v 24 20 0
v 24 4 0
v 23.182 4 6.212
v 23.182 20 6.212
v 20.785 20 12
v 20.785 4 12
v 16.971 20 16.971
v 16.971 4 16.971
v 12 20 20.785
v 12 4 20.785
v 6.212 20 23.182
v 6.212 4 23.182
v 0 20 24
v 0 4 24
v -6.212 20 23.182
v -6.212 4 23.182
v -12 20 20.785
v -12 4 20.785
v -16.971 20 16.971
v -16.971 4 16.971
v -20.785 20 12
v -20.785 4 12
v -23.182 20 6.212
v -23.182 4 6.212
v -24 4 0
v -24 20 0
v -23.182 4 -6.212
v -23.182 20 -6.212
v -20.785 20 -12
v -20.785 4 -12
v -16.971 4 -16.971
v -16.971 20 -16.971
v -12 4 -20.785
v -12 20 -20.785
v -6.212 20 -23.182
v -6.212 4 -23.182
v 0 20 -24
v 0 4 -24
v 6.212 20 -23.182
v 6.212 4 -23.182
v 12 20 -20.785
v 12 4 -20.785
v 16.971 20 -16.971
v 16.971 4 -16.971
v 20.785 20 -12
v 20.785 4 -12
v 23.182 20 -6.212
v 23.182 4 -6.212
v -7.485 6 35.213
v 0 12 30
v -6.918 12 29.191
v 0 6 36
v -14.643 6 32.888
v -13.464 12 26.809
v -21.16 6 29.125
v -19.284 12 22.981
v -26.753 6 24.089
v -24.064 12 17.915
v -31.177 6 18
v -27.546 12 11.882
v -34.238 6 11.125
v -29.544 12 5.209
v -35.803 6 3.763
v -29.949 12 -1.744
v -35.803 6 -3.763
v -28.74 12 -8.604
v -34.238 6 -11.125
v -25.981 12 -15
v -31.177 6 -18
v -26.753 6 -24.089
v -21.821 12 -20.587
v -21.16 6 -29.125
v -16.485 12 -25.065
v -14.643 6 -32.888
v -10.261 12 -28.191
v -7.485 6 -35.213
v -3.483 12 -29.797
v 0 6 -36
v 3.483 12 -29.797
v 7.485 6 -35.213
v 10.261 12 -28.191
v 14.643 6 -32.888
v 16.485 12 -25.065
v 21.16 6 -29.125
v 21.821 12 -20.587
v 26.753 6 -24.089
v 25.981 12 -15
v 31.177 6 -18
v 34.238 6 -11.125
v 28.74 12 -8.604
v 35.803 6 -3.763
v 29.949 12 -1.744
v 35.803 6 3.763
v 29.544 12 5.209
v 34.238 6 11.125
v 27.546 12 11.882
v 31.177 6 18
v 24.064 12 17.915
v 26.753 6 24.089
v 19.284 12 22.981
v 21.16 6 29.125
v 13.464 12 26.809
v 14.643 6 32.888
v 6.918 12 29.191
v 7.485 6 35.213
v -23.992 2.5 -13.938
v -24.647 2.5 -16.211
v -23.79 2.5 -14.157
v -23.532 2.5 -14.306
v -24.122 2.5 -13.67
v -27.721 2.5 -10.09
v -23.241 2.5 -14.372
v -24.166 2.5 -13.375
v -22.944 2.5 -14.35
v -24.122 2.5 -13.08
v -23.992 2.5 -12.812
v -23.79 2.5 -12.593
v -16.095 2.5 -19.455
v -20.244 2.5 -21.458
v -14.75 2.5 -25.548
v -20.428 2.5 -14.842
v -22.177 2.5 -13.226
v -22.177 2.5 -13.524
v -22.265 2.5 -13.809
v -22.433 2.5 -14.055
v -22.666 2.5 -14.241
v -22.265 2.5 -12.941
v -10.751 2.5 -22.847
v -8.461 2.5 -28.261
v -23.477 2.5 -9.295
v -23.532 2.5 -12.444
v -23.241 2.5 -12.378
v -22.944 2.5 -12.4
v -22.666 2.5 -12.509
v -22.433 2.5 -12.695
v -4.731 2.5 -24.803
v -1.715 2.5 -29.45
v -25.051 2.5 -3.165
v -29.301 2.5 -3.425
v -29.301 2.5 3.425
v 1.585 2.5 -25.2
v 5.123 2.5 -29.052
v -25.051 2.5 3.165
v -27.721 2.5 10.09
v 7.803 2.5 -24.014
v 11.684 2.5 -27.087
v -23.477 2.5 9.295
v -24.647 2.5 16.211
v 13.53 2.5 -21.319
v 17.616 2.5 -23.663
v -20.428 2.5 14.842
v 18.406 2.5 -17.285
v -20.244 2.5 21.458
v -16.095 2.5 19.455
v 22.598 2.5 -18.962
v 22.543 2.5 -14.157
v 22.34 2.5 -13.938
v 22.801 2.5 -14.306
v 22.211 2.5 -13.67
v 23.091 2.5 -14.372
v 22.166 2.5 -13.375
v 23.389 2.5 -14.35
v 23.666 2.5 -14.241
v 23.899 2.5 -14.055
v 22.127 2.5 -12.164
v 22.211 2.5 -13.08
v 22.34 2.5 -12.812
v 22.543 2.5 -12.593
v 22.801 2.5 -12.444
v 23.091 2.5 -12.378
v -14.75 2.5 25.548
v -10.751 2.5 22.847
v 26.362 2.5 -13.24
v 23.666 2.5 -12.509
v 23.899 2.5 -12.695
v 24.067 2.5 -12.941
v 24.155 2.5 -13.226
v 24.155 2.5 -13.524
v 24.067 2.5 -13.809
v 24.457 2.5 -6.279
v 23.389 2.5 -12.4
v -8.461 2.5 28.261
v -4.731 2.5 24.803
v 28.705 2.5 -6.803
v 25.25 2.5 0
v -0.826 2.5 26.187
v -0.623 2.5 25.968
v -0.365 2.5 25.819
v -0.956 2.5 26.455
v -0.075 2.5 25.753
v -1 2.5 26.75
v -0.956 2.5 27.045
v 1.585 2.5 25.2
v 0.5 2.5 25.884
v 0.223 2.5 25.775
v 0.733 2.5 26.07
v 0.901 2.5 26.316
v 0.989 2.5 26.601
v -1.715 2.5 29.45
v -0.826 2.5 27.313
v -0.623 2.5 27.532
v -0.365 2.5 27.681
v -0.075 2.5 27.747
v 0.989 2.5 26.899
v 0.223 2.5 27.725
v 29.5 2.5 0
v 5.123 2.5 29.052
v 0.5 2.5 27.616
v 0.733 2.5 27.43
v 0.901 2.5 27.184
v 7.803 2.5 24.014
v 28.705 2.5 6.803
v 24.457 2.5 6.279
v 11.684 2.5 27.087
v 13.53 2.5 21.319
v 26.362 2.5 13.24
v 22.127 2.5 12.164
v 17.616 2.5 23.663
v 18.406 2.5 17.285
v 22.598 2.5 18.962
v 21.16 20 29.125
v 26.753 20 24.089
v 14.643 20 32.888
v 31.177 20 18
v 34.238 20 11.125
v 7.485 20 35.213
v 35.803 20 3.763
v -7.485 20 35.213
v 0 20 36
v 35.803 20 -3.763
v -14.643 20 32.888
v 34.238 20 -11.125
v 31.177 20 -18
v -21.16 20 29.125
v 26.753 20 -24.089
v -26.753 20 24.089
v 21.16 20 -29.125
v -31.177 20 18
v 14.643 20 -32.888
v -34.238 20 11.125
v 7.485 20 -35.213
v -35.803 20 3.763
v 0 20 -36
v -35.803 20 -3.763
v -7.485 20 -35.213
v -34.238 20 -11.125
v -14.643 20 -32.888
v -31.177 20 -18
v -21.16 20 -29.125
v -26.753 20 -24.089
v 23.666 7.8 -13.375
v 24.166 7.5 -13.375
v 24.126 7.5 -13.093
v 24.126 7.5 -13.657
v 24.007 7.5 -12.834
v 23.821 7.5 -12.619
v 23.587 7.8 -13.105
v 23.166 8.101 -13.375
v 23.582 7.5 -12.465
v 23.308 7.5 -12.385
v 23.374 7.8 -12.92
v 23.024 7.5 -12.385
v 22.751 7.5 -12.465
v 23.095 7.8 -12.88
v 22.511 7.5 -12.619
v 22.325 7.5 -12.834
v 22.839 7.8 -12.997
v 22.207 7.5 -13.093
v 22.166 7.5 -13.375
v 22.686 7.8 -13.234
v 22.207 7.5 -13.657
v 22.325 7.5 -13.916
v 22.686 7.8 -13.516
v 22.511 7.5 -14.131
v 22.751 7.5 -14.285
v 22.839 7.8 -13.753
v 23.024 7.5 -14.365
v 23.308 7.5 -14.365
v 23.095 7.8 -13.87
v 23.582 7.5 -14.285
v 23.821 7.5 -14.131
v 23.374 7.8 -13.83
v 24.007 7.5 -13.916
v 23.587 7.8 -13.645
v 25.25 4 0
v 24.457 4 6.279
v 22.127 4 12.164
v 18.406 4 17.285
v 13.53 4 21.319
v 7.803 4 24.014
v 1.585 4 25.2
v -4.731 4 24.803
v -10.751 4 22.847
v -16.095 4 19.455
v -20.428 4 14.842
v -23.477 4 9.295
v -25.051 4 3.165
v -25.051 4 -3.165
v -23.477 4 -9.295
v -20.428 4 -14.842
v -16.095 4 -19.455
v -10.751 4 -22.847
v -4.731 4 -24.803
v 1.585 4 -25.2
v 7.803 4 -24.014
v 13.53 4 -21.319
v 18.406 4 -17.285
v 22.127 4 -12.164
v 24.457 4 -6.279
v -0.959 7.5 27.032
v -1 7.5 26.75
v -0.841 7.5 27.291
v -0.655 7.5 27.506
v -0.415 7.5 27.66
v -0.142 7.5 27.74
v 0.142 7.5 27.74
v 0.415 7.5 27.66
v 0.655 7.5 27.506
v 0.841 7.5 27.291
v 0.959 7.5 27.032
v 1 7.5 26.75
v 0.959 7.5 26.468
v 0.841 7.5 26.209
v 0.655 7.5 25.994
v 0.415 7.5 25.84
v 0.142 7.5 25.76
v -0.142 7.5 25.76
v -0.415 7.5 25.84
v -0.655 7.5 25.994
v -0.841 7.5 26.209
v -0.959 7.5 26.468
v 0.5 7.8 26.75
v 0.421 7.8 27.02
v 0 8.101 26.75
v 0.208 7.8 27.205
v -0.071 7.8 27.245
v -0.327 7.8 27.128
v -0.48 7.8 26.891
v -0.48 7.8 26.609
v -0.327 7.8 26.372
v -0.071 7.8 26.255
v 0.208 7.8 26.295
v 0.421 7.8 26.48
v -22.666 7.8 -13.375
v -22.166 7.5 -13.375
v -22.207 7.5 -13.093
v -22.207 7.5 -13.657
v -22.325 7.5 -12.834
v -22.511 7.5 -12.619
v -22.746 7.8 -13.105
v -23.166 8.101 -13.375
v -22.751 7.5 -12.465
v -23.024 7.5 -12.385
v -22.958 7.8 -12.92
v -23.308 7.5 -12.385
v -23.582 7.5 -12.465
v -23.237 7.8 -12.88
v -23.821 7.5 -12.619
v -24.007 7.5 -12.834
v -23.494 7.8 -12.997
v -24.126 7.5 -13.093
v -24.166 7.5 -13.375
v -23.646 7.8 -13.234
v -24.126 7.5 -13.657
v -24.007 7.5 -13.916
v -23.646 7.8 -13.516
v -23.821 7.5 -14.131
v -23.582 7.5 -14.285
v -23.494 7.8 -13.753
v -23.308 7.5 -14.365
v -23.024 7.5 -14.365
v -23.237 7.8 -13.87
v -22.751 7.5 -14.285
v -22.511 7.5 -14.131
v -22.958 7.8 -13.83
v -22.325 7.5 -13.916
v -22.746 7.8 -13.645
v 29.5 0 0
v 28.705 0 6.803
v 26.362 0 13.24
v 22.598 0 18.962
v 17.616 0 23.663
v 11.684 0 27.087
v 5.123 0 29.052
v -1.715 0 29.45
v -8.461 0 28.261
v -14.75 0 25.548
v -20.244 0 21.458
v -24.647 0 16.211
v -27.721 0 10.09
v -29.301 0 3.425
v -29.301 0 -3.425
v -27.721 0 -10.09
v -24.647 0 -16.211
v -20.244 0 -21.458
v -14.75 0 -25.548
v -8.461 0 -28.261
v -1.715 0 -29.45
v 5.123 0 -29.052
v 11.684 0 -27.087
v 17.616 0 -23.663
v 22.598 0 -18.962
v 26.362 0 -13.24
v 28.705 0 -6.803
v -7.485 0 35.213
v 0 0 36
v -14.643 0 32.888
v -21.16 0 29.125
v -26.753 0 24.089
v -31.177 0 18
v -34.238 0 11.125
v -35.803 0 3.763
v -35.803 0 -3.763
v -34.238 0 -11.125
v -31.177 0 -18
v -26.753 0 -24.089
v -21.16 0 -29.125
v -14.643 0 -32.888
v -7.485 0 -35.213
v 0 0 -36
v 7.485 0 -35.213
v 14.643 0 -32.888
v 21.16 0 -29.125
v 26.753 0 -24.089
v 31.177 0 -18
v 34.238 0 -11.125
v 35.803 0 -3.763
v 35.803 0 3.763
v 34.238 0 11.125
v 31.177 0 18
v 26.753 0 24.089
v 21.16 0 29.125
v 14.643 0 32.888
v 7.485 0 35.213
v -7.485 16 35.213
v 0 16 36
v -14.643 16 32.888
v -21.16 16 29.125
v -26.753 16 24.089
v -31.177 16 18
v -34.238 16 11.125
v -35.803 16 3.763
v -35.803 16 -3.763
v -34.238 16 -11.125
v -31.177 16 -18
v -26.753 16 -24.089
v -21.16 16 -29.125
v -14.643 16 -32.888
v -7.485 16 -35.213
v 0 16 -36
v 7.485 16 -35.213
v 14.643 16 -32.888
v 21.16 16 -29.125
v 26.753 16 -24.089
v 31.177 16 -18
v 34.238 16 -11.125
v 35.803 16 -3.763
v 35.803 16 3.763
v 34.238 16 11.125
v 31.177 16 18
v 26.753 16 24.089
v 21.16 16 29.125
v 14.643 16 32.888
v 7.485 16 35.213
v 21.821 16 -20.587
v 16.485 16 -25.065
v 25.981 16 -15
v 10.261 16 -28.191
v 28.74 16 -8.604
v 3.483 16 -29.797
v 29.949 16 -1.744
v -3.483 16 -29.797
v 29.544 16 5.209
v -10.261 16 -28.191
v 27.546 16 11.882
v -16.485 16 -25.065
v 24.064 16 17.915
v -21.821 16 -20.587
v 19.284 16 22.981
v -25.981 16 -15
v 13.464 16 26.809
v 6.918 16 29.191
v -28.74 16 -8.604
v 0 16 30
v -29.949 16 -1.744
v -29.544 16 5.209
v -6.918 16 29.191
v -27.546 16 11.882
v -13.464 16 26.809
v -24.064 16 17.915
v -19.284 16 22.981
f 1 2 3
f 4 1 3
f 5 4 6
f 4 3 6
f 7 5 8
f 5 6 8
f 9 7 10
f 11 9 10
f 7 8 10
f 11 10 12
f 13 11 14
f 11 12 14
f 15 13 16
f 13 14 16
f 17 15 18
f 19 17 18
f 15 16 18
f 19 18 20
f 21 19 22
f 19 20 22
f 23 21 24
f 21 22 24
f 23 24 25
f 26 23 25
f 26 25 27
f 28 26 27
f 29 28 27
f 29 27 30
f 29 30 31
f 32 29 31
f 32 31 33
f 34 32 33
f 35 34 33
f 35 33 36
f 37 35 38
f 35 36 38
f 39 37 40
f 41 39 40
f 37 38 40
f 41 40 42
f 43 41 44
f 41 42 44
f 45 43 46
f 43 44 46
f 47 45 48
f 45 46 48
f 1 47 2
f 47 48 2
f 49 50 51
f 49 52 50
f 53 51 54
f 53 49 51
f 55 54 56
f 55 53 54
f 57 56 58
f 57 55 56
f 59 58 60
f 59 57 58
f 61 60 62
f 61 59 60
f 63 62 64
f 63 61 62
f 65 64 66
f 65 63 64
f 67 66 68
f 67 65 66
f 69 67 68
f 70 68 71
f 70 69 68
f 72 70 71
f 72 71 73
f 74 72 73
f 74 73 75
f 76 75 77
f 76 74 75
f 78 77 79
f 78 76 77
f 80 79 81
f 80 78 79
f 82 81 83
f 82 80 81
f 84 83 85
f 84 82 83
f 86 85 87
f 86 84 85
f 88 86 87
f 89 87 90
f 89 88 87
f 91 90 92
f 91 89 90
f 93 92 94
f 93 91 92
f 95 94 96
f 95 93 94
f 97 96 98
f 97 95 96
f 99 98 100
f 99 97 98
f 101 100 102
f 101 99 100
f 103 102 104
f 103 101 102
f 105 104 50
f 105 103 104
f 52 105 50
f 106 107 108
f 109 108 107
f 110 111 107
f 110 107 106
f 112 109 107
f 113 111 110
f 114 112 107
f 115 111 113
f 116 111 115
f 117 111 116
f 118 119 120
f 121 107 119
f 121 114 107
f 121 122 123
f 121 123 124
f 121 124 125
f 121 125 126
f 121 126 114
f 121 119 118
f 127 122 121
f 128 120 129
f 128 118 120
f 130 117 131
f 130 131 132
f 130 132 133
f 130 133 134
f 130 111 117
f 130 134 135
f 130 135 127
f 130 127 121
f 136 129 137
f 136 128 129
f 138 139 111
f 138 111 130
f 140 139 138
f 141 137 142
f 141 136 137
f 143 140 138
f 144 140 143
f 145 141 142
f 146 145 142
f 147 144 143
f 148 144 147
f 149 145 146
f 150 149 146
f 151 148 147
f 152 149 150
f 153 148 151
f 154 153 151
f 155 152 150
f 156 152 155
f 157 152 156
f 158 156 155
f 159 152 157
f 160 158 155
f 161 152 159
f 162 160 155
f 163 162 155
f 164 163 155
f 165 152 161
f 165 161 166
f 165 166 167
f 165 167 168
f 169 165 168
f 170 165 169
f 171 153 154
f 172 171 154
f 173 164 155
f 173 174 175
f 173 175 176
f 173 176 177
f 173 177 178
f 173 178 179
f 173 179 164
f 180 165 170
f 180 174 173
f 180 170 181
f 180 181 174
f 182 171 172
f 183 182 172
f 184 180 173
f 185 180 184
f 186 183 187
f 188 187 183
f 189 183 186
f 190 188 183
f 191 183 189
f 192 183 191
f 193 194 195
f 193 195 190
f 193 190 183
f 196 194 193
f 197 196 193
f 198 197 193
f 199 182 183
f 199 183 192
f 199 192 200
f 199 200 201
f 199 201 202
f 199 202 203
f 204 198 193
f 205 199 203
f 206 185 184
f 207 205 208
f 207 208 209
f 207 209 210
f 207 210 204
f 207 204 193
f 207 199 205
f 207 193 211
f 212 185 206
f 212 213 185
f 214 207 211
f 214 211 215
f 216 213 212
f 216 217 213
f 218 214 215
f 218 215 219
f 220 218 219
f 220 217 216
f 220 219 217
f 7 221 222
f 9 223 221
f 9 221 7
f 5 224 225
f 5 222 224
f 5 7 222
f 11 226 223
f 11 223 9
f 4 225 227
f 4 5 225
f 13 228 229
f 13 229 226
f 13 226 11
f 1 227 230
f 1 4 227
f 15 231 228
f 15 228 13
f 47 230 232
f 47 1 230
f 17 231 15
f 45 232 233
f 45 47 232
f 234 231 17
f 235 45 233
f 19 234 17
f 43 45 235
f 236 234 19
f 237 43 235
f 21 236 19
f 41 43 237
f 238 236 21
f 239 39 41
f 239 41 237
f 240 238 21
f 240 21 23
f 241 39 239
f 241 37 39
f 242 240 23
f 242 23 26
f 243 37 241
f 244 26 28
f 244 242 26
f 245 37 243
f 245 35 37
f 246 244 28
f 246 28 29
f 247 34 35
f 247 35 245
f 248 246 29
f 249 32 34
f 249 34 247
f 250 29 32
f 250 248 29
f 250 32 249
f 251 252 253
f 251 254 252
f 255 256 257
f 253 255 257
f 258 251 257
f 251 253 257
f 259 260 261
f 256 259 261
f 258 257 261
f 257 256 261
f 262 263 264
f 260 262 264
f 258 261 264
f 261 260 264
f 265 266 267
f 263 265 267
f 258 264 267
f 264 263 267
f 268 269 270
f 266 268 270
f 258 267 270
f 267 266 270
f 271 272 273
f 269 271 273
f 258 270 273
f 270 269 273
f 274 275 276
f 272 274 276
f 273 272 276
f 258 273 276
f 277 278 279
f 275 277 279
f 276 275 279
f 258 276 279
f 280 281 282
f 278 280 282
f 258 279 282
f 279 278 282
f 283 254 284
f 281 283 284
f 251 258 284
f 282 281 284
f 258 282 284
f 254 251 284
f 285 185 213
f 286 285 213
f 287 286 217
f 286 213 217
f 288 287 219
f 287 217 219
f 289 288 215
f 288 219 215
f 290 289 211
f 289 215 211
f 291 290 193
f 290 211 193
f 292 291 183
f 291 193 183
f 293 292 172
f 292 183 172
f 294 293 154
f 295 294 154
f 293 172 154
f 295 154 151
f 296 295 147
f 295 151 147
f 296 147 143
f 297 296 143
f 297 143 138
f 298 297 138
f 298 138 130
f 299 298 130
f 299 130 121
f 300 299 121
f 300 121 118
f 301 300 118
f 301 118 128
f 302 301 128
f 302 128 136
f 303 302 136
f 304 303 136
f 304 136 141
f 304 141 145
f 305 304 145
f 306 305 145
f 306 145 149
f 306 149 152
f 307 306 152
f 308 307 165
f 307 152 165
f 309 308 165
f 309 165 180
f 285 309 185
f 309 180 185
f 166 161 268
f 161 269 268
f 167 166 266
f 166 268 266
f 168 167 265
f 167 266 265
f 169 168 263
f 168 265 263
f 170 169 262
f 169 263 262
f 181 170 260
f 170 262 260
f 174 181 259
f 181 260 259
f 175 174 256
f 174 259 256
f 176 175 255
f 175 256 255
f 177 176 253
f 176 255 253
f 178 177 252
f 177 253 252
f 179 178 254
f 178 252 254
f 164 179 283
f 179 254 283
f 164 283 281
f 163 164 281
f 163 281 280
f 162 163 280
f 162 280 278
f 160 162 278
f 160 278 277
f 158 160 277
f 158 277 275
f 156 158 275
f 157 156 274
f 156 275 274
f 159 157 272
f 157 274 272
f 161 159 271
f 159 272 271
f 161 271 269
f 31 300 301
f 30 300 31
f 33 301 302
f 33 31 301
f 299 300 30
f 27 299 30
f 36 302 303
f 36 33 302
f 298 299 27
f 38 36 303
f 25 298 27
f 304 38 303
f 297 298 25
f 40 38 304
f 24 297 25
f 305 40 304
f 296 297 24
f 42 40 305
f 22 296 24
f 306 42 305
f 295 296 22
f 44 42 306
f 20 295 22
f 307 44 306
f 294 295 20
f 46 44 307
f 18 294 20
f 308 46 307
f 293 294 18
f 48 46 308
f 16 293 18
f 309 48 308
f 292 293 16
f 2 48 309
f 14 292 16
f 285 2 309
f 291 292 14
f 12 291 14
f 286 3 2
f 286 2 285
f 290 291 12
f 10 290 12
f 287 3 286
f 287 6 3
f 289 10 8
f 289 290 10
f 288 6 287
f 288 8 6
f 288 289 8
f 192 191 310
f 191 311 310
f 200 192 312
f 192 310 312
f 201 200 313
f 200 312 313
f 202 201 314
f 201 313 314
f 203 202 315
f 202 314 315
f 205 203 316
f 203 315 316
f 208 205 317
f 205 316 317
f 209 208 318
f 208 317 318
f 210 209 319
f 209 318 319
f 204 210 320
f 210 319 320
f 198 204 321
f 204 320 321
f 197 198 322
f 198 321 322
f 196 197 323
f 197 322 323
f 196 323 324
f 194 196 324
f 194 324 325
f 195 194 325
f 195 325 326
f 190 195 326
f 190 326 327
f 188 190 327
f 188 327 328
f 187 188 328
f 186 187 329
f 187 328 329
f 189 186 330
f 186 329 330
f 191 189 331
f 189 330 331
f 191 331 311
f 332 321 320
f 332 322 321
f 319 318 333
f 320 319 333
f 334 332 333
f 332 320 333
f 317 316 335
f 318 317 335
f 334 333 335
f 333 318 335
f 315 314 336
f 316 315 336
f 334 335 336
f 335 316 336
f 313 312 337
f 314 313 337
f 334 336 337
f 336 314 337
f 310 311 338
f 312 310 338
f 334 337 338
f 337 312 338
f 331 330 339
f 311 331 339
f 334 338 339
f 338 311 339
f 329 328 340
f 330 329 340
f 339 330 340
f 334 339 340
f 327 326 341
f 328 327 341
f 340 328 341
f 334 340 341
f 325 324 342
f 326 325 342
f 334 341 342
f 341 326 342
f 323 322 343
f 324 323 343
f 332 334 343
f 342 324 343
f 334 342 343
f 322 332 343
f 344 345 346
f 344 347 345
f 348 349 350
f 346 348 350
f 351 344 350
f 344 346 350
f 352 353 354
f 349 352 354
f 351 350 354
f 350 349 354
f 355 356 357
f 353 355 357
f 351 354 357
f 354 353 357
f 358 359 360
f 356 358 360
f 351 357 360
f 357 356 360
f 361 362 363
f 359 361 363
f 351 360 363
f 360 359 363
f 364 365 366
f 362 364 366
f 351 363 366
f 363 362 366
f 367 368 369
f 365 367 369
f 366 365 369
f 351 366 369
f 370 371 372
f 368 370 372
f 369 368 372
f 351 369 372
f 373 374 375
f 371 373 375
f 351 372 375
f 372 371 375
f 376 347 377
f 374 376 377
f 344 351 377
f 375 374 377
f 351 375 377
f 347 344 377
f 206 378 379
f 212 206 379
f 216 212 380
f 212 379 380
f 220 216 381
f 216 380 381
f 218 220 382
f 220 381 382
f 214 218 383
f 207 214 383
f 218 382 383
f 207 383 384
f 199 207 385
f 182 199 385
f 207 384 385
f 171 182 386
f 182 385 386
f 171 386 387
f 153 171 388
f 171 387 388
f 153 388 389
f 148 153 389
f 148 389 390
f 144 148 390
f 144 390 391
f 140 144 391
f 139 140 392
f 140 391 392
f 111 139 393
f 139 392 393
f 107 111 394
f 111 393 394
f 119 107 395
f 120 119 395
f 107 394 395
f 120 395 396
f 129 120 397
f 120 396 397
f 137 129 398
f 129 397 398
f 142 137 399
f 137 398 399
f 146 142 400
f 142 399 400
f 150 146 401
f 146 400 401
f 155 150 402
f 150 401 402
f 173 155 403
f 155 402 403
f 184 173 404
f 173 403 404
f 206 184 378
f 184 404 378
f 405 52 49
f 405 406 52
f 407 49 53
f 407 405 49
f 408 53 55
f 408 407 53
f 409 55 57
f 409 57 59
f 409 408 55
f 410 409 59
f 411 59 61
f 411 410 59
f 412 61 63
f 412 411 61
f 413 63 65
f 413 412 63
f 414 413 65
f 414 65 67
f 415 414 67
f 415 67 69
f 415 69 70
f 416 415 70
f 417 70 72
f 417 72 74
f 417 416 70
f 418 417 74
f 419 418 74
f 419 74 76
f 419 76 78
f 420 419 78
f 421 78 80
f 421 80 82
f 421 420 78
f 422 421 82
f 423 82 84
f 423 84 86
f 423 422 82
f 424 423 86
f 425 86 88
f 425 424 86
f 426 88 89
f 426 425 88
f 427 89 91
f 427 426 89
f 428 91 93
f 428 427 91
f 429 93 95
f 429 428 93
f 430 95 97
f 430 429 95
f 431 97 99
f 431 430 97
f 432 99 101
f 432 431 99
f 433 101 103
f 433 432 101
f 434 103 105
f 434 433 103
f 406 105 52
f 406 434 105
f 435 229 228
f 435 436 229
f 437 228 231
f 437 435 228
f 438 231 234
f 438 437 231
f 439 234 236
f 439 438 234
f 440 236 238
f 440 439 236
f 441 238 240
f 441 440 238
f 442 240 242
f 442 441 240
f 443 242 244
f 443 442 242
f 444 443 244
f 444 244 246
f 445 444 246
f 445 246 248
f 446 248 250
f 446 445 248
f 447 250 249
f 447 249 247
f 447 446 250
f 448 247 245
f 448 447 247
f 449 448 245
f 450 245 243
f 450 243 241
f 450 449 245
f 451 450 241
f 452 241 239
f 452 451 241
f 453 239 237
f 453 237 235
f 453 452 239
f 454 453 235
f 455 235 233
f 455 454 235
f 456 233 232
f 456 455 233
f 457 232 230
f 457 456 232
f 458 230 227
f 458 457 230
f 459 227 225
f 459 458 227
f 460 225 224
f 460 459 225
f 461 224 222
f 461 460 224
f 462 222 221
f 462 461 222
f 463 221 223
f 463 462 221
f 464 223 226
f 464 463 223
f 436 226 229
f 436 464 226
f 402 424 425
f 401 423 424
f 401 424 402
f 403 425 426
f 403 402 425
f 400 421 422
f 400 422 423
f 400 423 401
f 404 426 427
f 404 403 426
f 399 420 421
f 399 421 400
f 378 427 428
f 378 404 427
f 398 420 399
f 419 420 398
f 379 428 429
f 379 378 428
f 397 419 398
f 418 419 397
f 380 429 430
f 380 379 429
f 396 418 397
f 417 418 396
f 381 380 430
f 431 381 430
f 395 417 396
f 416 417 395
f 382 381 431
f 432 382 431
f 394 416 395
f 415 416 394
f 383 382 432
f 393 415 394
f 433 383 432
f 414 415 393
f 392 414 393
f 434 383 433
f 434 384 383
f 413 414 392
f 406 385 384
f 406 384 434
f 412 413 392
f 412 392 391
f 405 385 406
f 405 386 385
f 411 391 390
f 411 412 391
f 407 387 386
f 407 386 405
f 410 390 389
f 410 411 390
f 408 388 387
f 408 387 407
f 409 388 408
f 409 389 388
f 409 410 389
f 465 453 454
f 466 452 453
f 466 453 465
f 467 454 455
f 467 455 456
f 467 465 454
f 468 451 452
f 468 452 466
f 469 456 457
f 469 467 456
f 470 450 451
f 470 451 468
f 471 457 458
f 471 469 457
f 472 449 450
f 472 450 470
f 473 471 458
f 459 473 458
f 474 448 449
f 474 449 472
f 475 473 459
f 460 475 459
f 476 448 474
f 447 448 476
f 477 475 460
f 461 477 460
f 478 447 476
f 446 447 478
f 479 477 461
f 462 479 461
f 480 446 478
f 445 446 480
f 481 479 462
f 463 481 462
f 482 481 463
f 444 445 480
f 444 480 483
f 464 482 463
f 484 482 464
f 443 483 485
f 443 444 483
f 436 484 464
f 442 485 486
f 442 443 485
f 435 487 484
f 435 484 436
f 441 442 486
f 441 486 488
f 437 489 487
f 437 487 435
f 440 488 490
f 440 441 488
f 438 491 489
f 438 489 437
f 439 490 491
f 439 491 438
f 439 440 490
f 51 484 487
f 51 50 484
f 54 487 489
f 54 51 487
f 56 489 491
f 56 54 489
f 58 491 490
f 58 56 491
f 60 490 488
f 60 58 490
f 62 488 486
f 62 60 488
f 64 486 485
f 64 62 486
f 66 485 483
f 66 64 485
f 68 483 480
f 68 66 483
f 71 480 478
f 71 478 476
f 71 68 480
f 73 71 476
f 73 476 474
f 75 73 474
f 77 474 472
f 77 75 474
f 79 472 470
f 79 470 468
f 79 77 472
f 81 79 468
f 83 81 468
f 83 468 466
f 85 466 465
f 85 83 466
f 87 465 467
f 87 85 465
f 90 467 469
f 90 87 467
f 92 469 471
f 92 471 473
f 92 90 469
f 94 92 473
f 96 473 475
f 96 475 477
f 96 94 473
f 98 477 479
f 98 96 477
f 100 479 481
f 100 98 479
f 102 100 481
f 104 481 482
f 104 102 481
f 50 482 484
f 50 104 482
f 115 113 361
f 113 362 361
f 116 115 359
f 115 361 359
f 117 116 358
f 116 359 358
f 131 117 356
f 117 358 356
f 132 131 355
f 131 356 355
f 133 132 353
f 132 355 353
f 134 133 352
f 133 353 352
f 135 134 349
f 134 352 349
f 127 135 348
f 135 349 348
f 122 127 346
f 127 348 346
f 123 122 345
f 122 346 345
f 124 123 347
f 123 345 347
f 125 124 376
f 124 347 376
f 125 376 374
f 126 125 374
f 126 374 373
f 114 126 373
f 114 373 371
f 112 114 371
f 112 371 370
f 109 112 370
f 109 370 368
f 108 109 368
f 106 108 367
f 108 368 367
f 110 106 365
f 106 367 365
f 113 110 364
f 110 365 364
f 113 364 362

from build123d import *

# Parameters (mm, degrees)
F2_R     = 25.25
F3_DEPTH = 4
F4_R     = 24
F5_DEPTH = 16
F6_R     = 29.5
F6_R_2   = 25.25
F7_DEPTH = 2.5
F9_D     = 2
F9_DEPTH = 5
F9_TIP   = 0.600860619


with BuildPart() as f1:
    # F0 (on Right) → F1 (revolve)
    with BuildSketch(Plane.YZ):
        Polygon((0, 36), (0, 0), (20, 0), (20, 36), (16, 36), (16, 30), (12, 30), (6, 36), align=None)
    revolve(axis=Axis((0, 10, 0), (0, -1, 0)))

    # F2 (on face) → F3 (cut)
    with BuildSketch(Plane.XZ):
        Circle(F2_R)
    extrude(amount=-F3_DEPTH, mode=Mode.SUBTRACT)

    # F4 (on face) → F5 (cut, through all)
    with BuildSketch(Plane.XZ.offset(-4)):
        Circle(F4_R)
    extrude(amount=-F5_DEPTH, mode=Mode.SUBTRACT)

    # F6 (on face) → F7 (cut)
    with BuildSketch(Plane.XZ):
        Circle(F6_R)
        Circle(F6_R_2, mode=Mode.SUBTRACT)
    extrude(amount=-F7_DEPTH, mode=Mode.SUBTRACT)

    # F9
    with Locations(Plane.XZ.offset(-2.5)):
        with Locations((0, 26.75), (23.1661795512, -13.375), (-23.1661795512, -13.375)):
            Hole(F9_D / 2, depth=F9_DEPTH)
            with Locations((0, 0, -(F9_DEPTH + F9_TIP / 2))):  # 118° drill point
                Cone(0, F9_D / 2, F9_TIP, mode=Mode.SUBTRACT)


solid = f1.part
